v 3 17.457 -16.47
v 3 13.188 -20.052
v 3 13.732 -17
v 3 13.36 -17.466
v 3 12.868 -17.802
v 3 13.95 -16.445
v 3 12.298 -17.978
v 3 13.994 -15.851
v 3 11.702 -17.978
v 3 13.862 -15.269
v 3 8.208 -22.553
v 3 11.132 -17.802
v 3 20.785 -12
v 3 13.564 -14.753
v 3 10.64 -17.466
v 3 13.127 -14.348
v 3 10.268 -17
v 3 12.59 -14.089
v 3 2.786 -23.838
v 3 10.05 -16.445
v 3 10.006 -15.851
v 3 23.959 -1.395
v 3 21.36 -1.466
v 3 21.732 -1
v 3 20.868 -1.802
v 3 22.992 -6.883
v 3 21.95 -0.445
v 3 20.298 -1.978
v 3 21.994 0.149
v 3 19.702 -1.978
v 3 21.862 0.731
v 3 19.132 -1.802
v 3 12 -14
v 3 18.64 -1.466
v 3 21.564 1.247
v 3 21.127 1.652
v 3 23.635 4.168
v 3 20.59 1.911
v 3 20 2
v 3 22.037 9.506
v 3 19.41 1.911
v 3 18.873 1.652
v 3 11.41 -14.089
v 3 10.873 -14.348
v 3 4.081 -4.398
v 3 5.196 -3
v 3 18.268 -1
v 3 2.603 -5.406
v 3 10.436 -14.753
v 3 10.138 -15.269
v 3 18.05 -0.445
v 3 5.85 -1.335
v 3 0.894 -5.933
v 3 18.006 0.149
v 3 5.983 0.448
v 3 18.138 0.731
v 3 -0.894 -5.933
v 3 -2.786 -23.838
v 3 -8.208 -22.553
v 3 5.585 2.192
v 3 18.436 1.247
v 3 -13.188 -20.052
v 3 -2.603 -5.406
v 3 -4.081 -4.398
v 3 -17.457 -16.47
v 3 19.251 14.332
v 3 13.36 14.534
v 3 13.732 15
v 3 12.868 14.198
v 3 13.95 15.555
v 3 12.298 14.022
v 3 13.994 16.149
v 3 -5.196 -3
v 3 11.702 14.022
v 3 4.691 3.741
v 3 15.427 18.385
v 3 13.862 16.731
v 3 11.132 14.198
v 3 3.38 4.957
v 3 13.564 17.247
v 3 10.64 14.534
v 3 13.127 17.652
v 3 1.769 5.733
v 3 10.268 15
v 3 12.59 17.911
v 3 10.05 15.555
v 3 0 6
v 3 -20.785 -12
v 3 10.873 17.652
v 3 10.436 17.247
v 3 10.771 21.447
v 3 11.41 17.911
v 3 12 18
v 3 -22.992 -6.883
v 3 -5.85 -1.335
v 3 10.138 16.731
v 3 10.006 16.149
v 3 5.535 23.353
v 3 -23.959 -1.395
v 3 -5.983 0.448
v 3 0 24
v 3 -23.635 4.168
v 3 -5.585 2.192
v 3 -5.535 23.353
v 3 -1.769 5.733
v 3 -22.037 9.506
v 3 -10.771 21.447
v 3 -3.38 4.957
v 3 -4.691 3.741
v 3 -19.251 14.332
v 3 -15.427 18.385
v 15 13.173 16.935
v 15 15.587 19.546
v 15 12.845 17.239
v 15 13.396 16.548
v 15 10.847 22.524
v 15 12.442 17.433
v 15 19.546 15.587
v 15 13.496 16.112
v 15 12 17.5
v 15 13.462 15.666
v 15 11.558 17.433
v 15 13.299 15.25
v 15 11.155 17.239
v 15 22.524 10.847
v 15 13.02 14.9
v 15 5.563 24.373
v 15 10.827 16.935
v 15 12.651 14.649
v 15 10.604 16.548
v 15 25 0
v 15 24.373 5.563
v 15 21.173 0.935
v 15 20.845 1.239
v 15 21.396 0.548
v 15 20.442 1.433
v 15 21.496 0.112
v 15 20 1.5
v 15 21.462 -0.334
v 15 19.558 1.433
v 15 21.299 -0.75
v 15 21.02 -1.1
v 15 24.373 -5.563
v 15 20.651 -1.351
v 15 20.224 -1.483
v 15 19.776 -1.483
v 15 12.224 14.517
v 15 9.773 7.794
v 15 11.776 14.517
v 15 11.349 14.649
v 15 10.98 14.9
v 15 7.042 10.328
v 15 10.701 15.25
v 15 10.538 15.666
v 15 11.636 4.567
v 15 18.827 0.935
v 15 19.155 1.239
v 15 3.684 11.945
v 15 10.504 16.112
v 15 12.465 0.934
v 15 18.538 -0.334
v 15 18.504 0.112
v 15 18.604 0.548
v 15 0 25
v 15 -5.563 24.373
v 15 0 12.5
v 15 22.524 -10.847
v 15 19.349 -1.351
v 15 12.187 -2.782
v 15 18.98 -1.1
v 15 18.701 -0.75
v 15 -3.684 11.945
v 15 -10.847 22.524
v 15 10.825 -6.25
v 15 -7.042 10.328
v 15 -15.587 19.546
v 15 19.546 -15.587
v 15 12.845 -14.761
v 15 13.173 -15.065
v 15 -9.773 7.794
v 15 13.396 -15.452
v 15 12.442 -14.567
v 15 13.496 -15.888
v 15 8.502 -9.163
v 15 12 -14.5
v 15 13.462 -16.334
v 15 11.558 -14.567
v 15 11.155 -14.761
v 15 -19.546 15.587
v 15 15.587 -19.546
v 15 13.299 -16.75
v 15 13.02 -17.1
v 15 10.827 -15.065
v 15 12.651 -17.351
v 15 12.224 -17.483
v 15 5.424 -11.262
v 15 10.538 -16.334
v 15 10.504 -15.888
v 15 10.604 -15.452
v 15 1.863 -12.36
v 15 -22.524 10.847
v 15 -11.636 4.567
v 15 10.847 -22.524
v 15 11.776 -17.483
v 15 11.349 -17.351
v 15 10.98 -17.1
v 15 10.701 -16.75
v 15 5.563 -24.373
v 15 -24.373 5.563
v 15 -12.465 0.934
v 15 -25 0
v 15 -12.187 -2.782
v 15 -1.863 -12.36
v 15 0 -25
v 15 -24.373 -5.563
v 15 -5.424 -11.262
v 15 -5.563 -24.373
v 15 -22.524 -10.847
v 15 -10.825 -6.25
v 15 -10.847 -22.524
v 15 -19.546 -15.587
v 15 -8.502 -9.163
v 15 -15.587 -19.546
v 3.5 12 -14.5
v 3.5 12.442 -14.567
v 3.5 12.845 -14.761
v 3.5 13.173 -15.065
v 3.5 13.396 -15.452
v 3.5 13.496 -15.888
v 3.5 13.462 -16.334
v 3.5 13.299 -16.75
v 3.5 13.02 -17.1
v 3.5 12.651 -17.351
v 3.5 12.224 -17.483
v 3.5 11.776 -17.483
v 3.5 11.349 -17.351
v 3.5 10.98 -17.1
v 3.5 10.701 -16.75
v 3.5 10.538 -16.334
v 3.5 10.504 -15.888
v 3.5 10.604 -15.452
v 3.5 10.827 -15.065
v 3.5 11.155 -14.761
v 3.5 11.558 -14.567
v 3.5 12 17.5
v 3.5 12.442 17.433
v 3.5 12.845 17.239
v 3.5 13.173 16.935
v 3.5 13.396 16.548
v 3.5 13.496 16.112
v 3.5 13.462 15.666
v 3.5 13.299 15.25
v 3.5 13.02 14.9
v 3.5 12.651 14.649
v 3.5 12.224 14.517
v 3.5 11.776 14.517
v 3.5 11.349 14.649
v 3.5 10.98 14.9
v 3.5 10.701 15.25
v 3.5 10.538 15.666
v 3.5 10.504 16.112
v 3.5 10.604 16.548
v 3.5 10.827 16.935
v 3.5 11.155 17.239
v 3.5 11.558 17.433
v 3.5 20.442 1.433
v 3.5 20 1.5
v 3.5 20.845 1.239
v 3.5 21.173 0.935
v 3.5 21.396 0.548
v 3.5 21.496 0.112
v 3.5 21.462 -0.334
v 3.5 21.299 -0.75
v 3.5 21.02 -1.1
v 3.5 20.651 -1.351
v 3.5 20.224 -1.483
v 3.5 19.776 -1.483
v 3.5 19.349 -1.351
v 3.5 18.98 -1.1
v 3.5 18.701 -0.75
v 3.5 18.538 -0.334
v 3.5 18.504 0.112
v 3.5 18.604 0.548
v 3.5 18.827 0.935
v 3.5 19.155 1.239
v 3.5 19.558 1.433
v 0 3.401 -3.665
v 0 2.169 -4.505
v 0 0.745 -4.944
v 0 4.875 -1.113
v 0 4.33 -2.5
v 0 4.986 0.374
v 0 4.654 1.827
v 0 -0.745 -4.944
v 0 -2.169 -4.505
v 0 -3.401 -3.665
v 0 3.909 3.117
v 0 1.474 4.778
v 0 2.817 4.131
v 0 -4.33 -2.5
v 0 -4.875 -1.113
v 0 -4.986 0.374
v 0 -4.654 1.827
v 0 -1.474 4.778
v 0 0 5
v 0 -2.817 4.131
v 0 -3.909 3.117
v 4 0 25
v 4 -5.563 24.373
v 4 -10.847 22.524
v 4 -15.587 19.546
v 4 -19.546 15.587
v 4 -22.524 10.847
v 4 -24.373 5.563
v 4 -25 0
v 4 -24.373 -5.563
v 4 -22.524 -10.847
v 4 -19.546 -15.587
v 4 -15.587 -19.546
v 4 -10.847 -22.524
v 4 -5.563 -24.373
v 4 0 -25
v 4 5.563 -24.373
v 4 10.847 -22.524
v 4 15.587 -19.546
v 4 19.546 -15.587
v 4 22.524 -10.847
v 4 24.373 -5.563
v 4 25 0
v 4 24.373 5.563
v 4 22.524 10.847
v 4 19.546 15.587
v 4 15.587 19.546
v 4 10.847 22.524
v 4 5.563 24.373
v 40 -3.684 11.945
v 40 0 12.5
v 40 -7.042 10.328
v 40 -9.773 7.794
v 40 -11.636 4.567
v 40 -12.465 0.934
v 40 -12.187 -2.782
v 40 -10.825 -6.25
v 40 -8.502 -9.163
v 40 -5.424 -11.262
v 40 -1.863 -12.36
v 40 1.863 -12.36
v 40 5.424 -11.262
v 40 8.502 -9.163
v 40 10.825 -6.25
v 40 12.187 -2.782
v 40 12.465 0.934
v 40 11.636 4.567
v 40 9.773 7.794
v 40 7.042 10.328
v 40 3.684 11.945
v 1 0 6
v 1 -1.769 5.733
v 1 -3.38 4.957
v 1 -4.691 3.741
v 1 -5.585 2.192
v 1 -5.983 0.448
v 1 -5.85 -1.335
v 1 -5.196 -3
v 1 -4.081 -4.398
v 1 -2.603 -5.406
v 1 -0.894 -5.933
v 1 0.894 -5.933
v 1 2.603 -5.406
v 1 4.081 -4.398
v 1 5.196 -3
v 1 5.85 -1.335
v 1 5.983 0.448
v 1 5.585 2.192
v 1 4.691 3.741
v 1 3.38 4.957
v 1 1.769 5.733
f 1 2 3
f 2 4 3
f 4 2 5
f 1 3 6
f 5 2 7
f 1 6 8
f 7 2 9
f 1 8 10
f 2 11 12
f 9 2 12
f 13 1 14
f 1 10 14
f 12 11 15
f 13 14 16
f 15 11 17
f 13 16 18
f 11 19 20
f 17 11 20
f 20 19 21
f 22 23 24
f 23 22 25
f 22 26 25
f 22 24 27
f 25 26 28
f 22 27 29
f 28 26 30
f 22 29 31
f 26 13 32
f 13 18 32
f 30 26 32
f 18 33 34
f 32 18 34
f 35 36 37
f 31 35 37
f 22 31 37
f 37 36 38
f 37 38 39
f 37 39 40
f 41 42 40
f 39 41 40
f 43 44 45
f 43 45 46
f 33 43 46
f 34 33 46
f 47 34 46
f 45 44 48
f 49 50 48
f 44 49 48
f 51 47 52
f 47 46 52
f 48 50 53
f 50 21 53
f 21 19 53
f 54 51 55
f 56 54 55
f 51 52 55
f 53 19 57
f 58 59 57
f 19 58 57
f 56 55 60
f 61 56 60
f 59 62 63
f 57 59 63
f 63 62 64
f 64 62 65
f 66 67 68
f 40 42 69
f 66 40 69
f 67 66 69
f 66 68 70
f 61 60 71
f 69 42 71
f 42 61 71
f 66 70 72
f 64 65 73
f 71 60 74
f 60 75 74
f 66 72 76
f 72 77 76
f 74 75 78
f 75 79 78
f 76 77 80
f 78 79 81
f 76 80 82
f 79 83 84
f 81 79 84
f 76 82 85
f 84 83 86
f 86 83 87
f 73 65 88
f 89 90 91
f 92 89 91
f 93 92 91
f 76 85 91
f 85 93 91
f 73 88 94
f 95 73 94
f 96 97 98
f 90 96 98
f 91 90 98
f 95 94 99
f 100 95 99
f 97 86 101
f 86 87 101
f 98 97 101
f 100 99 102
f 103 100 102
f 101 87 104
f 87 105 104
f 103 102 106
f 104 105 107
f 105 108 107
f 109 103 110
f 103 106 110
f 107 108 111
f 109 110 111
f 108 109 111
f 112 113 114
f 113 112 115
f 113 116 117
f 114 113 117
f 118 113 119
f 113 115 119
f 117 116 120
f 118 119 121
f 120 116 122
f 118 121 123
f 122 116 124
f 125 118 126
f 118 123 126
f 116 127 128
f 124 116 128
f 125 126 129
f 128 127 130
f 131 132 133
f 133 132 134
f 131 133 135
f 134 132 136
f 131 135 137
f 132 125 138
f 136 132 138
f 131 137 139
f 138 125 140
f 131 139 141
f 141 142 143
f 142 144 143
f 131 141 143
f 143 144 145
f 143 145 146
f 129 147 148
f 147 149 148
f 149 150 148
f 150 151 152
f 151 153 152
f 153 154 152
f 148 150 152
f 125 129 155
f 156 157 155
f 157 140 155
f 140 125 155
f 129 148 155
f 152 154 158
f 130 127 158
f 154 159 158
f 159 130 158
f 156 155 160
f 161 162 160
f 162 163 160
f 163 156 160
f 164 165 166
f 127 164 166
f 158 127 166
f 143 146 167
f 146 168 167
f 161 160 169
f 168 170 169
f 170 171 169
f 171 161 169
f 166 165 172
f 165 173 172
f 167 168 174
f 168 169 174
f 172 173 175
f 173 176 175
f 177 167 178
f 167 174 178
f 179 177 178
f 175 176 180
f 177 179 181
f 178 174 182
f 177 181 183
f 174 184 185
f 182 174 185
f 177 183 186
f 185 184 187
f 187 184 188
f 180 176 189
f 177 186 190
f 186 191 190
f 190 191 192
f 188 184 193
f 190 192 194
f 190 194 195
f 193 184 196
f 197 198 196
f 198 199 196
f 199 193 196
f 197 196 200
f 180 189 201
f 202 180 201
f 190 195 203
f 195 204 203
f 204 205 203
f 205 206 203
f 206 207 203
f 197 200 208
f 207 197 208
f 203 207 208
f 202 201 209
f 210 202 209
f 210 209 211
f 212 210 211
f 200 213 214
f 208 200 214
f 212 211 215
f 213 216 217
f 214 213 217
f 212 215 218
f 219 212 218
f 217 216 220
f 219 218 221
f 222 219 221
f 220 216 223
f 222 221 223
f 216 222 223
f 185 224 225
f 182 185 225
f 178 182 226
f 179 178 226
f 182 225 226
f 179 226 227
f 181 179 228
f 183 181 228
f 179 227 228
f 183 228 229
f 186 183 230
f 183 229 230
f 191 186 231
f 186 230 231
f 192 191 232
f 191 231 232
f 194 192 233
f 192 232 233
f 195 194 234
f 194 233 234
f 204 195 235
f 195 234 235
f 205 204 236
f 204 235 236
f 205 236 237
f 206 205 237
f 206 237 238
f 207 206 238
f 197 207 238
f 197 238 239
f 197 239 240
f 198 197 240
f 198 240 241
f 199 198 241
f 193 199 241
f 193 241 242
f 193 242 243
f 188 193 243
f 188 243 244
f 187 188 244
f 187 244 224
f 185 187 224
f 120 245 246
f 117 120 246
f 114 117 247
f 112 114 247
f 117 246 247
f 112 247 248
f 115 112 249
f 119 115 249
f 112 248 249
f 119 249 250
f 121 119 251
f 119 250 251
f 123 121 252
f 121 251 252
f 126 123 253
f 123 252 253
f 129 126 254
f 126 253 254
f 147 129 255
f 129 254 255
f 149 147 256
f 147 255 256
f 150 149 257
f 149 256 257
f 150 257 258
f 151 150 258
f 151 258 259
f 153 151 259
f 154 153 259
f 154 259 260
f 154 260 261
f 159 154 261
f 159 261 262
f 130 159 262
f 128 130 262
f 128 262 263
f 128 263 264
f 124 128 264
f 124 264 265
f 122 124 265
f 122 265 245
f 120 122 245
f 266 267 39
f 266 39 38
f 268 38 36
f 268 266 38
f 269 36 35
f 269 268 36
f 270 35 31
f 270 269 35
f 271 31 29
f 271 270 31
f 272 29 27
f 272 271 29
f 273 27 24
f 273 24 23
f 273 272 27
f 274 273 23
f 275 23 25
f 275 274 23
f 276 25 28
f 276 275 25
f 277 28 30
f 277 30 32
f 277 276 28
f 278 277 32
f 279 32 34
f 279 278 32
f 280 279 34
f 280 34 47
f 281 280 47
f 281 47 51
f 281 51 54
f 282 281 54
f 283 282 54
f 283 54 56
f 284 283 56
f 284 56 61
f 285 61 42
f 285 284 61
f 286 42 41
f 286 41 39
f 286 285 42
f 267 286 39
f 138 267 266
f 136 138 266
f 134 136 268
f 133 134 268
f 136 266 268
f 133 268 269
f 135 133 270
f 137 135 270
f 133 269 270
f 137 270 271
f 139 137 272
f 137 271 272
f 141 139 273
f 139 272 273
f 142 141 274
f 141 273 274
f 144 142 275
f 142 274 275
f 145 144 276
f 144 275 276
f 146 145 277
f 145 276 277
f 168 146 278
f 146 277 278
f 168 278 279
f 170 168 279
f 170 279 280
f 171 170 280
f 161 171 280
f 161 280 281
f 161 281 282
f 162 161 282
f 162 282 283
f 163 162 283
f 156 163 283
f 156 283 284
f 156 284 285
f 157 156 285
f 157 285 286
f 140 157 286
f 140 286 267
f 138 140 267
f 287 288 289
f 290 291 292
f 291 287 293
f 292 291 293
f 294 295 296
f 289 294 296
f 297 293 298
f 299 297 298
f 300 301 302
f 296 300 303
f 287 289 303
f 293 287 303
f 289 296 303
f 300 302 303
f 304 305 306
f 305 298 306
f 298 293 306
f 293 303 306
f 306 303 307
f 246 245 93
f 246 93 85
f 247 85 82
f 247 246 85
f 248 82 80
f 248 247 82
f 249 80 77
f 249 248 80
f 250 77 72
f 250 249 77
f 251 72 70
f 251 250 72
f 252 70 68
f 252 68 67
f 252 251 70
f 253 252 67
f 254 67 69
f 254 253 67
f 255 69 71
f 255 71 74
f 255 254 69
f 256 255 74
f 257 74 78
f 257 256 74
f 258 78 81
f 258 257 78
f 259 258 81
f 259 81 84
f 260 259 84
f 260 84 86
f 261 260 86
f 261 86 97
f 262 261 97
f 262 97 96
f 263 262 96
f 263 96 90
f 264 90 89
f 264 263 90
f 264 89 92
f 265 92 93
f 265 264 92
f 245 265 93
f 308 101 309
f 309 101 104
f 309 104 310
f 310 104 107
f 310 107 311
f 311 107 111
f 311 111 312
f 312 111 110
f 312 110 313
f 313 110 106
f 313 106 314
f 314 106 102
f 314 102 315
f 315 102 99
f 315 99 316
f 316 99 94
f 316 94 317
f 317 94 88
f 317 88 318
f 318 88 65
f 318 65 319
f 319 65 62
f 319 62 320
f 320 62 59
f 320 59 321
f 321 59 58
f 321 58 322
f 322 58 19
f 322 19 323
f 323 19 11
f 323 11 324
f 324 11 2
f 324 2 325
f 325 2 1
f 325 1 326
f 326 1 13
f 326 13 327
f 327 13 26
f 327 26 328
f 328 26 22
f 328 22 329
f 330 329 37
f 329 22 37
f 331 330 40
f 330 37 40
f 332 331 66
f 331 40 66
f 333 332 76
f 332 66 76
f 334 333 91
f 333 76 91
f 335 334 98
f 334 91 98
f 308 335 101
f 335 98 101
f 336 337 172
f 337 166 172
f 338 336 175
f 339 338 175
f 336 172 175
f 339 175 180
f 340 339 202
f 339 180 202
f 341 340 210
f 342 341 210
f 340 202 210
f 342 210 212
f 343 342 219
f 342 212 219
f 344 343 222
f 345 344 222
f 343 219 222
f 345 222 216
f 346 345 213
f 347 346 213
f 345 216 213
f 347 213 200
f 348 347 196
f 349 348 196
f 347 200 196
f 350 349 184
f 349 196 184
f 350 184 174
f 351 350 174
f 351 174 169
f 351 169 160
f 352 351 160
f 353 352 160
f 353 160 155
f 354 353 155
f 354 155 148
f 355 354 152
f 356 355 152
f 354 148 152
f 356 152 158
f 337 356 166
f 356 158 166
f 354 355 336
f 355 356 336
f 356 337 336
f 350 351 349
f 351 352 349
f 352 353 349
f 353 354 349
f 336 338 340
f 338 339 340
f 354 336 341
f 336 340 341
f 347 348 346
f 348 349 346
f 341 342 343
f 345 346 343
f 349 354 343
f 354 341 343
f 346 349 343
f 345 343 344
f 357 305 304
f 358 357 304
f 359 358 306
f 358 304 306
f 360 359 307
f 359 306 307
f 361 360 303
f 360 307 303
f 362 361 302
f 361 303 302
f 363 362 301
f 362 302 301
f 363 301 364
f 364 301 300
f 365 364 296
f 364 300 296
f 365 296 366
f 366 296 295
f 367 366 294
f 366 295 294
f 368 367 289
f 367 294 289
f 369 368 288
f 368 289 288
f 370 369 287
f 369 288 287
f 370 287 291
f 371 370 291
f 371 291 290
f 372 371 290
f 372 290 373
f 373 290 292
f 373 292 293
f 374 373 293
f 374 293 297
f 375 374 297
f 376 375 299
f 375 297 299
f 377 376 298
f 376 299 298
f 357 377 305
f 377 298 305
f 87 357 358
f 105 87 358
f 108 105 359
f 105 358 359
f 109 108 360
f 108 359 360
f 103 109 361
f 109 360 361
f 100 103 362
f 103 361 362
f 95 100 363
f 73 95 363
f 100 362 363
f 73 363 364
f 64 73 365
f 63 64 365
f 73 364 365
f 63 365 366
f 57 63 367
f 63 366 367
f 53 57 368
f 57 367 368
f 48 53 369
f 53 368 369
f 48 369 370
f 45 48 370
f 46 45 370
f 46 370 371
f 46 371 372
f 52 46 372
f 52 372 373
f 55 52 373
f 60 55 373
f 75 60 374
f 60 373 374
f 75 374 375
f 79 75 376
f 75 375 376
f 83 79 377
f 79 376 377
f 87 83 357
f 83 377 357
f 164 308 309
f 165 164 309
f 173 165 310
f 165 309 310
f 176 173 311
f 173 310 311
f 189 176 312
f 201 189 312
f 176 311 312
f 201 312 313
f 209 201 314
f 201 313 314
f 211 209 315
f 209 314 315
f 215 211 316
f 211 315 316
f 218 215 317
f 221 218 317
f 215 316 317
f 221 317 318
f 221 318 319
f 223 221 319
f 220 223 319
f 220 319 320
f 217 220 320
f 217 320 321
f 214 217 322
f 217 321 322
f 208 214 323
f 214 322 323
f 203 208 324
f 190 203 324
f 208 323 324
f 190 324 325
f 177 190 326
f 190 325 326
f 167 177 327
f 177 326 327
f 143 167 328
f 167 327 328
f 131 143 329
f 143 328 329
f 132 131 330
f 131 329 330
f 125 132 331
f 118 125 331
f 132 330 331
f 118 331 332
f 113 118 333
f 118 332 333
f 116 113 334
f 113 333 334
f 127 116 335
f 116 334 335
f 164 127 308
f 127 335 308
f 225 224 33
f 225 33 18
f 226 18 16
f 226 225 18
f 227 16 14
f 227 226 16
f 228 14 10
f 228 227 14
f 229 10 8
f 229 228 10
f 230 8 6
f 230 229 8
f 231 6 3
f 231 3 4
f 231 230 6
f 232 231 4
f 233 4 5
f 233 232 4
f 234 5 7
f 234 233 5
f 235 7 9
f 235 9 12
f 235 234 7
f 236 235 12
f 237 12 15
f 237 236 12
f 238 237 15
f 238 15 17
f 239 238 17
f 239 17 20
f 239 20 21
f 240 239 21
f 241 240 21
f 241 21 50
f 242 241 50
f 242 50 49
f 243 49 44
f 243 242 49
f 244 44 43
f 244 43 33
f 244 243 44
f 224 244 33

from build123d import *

# Parameters (mm, degrees)
CHAMFER1_SIZE      = 1
SKETCH2_R          = 1.5
CUT_EXTRUDE1_DEPTH = 52.176166328
CHAMFER2_SIZE      = 0.5


with BuildPart() as part:
    # Sketch1 → Revolve1 (revolve)
    with BuildSketch(Plane.XY, mode=Mode.PRIVATE) as revolve1_sk:
        Polygon((0, 0), (40, 0), (40, 12.5), (15, 12.5), (15, 25), (3, 25), (3, 6), (0, 6), align=None)
    revolve(revolve1_sk.sketch.rotate(Axis((0, 0, 0), (1, 0, 0)), 90), axis=Axis((0, 0, 0), (1, 0, 0)))

    # Chamfer1
    chamfer1_edges = [part.edges().sort_by_distance(p)[0] for p in [
        (0, 0, -6),
        (3, 0, -25),
    ]]
    chamfer(chamfer1_edges, length=CHAMFER1_SIZE)

    # Sketch2 → Cut-Extrude1 (cut, through all)
    with BuildSketch(Plane.ZY.offset(-3)):
        with Locations((-16, 12)):
            Circle(SKETCH2_R)
        with Locations((0, 20)):
            Circle(SKETCH2_R)
        with Locations((16, 12)):
            Circle(SKETCH2_R)
    extrude(amount=-CUT_EXTRUDE1_DEPTH, mode=Mode.SUBTRACT)

    # Chamfer2
    chamfer2_edges = [part.edges().sort_by_distance(p)[0] for p in [
        (3, 12, -17.5),
        (3, 20, -1.5),
        (3, 12, 14.5),
    ]]
    chamfer(chamfer2_edges, length=CHAMFER2_SIZE)


solid = part.part
